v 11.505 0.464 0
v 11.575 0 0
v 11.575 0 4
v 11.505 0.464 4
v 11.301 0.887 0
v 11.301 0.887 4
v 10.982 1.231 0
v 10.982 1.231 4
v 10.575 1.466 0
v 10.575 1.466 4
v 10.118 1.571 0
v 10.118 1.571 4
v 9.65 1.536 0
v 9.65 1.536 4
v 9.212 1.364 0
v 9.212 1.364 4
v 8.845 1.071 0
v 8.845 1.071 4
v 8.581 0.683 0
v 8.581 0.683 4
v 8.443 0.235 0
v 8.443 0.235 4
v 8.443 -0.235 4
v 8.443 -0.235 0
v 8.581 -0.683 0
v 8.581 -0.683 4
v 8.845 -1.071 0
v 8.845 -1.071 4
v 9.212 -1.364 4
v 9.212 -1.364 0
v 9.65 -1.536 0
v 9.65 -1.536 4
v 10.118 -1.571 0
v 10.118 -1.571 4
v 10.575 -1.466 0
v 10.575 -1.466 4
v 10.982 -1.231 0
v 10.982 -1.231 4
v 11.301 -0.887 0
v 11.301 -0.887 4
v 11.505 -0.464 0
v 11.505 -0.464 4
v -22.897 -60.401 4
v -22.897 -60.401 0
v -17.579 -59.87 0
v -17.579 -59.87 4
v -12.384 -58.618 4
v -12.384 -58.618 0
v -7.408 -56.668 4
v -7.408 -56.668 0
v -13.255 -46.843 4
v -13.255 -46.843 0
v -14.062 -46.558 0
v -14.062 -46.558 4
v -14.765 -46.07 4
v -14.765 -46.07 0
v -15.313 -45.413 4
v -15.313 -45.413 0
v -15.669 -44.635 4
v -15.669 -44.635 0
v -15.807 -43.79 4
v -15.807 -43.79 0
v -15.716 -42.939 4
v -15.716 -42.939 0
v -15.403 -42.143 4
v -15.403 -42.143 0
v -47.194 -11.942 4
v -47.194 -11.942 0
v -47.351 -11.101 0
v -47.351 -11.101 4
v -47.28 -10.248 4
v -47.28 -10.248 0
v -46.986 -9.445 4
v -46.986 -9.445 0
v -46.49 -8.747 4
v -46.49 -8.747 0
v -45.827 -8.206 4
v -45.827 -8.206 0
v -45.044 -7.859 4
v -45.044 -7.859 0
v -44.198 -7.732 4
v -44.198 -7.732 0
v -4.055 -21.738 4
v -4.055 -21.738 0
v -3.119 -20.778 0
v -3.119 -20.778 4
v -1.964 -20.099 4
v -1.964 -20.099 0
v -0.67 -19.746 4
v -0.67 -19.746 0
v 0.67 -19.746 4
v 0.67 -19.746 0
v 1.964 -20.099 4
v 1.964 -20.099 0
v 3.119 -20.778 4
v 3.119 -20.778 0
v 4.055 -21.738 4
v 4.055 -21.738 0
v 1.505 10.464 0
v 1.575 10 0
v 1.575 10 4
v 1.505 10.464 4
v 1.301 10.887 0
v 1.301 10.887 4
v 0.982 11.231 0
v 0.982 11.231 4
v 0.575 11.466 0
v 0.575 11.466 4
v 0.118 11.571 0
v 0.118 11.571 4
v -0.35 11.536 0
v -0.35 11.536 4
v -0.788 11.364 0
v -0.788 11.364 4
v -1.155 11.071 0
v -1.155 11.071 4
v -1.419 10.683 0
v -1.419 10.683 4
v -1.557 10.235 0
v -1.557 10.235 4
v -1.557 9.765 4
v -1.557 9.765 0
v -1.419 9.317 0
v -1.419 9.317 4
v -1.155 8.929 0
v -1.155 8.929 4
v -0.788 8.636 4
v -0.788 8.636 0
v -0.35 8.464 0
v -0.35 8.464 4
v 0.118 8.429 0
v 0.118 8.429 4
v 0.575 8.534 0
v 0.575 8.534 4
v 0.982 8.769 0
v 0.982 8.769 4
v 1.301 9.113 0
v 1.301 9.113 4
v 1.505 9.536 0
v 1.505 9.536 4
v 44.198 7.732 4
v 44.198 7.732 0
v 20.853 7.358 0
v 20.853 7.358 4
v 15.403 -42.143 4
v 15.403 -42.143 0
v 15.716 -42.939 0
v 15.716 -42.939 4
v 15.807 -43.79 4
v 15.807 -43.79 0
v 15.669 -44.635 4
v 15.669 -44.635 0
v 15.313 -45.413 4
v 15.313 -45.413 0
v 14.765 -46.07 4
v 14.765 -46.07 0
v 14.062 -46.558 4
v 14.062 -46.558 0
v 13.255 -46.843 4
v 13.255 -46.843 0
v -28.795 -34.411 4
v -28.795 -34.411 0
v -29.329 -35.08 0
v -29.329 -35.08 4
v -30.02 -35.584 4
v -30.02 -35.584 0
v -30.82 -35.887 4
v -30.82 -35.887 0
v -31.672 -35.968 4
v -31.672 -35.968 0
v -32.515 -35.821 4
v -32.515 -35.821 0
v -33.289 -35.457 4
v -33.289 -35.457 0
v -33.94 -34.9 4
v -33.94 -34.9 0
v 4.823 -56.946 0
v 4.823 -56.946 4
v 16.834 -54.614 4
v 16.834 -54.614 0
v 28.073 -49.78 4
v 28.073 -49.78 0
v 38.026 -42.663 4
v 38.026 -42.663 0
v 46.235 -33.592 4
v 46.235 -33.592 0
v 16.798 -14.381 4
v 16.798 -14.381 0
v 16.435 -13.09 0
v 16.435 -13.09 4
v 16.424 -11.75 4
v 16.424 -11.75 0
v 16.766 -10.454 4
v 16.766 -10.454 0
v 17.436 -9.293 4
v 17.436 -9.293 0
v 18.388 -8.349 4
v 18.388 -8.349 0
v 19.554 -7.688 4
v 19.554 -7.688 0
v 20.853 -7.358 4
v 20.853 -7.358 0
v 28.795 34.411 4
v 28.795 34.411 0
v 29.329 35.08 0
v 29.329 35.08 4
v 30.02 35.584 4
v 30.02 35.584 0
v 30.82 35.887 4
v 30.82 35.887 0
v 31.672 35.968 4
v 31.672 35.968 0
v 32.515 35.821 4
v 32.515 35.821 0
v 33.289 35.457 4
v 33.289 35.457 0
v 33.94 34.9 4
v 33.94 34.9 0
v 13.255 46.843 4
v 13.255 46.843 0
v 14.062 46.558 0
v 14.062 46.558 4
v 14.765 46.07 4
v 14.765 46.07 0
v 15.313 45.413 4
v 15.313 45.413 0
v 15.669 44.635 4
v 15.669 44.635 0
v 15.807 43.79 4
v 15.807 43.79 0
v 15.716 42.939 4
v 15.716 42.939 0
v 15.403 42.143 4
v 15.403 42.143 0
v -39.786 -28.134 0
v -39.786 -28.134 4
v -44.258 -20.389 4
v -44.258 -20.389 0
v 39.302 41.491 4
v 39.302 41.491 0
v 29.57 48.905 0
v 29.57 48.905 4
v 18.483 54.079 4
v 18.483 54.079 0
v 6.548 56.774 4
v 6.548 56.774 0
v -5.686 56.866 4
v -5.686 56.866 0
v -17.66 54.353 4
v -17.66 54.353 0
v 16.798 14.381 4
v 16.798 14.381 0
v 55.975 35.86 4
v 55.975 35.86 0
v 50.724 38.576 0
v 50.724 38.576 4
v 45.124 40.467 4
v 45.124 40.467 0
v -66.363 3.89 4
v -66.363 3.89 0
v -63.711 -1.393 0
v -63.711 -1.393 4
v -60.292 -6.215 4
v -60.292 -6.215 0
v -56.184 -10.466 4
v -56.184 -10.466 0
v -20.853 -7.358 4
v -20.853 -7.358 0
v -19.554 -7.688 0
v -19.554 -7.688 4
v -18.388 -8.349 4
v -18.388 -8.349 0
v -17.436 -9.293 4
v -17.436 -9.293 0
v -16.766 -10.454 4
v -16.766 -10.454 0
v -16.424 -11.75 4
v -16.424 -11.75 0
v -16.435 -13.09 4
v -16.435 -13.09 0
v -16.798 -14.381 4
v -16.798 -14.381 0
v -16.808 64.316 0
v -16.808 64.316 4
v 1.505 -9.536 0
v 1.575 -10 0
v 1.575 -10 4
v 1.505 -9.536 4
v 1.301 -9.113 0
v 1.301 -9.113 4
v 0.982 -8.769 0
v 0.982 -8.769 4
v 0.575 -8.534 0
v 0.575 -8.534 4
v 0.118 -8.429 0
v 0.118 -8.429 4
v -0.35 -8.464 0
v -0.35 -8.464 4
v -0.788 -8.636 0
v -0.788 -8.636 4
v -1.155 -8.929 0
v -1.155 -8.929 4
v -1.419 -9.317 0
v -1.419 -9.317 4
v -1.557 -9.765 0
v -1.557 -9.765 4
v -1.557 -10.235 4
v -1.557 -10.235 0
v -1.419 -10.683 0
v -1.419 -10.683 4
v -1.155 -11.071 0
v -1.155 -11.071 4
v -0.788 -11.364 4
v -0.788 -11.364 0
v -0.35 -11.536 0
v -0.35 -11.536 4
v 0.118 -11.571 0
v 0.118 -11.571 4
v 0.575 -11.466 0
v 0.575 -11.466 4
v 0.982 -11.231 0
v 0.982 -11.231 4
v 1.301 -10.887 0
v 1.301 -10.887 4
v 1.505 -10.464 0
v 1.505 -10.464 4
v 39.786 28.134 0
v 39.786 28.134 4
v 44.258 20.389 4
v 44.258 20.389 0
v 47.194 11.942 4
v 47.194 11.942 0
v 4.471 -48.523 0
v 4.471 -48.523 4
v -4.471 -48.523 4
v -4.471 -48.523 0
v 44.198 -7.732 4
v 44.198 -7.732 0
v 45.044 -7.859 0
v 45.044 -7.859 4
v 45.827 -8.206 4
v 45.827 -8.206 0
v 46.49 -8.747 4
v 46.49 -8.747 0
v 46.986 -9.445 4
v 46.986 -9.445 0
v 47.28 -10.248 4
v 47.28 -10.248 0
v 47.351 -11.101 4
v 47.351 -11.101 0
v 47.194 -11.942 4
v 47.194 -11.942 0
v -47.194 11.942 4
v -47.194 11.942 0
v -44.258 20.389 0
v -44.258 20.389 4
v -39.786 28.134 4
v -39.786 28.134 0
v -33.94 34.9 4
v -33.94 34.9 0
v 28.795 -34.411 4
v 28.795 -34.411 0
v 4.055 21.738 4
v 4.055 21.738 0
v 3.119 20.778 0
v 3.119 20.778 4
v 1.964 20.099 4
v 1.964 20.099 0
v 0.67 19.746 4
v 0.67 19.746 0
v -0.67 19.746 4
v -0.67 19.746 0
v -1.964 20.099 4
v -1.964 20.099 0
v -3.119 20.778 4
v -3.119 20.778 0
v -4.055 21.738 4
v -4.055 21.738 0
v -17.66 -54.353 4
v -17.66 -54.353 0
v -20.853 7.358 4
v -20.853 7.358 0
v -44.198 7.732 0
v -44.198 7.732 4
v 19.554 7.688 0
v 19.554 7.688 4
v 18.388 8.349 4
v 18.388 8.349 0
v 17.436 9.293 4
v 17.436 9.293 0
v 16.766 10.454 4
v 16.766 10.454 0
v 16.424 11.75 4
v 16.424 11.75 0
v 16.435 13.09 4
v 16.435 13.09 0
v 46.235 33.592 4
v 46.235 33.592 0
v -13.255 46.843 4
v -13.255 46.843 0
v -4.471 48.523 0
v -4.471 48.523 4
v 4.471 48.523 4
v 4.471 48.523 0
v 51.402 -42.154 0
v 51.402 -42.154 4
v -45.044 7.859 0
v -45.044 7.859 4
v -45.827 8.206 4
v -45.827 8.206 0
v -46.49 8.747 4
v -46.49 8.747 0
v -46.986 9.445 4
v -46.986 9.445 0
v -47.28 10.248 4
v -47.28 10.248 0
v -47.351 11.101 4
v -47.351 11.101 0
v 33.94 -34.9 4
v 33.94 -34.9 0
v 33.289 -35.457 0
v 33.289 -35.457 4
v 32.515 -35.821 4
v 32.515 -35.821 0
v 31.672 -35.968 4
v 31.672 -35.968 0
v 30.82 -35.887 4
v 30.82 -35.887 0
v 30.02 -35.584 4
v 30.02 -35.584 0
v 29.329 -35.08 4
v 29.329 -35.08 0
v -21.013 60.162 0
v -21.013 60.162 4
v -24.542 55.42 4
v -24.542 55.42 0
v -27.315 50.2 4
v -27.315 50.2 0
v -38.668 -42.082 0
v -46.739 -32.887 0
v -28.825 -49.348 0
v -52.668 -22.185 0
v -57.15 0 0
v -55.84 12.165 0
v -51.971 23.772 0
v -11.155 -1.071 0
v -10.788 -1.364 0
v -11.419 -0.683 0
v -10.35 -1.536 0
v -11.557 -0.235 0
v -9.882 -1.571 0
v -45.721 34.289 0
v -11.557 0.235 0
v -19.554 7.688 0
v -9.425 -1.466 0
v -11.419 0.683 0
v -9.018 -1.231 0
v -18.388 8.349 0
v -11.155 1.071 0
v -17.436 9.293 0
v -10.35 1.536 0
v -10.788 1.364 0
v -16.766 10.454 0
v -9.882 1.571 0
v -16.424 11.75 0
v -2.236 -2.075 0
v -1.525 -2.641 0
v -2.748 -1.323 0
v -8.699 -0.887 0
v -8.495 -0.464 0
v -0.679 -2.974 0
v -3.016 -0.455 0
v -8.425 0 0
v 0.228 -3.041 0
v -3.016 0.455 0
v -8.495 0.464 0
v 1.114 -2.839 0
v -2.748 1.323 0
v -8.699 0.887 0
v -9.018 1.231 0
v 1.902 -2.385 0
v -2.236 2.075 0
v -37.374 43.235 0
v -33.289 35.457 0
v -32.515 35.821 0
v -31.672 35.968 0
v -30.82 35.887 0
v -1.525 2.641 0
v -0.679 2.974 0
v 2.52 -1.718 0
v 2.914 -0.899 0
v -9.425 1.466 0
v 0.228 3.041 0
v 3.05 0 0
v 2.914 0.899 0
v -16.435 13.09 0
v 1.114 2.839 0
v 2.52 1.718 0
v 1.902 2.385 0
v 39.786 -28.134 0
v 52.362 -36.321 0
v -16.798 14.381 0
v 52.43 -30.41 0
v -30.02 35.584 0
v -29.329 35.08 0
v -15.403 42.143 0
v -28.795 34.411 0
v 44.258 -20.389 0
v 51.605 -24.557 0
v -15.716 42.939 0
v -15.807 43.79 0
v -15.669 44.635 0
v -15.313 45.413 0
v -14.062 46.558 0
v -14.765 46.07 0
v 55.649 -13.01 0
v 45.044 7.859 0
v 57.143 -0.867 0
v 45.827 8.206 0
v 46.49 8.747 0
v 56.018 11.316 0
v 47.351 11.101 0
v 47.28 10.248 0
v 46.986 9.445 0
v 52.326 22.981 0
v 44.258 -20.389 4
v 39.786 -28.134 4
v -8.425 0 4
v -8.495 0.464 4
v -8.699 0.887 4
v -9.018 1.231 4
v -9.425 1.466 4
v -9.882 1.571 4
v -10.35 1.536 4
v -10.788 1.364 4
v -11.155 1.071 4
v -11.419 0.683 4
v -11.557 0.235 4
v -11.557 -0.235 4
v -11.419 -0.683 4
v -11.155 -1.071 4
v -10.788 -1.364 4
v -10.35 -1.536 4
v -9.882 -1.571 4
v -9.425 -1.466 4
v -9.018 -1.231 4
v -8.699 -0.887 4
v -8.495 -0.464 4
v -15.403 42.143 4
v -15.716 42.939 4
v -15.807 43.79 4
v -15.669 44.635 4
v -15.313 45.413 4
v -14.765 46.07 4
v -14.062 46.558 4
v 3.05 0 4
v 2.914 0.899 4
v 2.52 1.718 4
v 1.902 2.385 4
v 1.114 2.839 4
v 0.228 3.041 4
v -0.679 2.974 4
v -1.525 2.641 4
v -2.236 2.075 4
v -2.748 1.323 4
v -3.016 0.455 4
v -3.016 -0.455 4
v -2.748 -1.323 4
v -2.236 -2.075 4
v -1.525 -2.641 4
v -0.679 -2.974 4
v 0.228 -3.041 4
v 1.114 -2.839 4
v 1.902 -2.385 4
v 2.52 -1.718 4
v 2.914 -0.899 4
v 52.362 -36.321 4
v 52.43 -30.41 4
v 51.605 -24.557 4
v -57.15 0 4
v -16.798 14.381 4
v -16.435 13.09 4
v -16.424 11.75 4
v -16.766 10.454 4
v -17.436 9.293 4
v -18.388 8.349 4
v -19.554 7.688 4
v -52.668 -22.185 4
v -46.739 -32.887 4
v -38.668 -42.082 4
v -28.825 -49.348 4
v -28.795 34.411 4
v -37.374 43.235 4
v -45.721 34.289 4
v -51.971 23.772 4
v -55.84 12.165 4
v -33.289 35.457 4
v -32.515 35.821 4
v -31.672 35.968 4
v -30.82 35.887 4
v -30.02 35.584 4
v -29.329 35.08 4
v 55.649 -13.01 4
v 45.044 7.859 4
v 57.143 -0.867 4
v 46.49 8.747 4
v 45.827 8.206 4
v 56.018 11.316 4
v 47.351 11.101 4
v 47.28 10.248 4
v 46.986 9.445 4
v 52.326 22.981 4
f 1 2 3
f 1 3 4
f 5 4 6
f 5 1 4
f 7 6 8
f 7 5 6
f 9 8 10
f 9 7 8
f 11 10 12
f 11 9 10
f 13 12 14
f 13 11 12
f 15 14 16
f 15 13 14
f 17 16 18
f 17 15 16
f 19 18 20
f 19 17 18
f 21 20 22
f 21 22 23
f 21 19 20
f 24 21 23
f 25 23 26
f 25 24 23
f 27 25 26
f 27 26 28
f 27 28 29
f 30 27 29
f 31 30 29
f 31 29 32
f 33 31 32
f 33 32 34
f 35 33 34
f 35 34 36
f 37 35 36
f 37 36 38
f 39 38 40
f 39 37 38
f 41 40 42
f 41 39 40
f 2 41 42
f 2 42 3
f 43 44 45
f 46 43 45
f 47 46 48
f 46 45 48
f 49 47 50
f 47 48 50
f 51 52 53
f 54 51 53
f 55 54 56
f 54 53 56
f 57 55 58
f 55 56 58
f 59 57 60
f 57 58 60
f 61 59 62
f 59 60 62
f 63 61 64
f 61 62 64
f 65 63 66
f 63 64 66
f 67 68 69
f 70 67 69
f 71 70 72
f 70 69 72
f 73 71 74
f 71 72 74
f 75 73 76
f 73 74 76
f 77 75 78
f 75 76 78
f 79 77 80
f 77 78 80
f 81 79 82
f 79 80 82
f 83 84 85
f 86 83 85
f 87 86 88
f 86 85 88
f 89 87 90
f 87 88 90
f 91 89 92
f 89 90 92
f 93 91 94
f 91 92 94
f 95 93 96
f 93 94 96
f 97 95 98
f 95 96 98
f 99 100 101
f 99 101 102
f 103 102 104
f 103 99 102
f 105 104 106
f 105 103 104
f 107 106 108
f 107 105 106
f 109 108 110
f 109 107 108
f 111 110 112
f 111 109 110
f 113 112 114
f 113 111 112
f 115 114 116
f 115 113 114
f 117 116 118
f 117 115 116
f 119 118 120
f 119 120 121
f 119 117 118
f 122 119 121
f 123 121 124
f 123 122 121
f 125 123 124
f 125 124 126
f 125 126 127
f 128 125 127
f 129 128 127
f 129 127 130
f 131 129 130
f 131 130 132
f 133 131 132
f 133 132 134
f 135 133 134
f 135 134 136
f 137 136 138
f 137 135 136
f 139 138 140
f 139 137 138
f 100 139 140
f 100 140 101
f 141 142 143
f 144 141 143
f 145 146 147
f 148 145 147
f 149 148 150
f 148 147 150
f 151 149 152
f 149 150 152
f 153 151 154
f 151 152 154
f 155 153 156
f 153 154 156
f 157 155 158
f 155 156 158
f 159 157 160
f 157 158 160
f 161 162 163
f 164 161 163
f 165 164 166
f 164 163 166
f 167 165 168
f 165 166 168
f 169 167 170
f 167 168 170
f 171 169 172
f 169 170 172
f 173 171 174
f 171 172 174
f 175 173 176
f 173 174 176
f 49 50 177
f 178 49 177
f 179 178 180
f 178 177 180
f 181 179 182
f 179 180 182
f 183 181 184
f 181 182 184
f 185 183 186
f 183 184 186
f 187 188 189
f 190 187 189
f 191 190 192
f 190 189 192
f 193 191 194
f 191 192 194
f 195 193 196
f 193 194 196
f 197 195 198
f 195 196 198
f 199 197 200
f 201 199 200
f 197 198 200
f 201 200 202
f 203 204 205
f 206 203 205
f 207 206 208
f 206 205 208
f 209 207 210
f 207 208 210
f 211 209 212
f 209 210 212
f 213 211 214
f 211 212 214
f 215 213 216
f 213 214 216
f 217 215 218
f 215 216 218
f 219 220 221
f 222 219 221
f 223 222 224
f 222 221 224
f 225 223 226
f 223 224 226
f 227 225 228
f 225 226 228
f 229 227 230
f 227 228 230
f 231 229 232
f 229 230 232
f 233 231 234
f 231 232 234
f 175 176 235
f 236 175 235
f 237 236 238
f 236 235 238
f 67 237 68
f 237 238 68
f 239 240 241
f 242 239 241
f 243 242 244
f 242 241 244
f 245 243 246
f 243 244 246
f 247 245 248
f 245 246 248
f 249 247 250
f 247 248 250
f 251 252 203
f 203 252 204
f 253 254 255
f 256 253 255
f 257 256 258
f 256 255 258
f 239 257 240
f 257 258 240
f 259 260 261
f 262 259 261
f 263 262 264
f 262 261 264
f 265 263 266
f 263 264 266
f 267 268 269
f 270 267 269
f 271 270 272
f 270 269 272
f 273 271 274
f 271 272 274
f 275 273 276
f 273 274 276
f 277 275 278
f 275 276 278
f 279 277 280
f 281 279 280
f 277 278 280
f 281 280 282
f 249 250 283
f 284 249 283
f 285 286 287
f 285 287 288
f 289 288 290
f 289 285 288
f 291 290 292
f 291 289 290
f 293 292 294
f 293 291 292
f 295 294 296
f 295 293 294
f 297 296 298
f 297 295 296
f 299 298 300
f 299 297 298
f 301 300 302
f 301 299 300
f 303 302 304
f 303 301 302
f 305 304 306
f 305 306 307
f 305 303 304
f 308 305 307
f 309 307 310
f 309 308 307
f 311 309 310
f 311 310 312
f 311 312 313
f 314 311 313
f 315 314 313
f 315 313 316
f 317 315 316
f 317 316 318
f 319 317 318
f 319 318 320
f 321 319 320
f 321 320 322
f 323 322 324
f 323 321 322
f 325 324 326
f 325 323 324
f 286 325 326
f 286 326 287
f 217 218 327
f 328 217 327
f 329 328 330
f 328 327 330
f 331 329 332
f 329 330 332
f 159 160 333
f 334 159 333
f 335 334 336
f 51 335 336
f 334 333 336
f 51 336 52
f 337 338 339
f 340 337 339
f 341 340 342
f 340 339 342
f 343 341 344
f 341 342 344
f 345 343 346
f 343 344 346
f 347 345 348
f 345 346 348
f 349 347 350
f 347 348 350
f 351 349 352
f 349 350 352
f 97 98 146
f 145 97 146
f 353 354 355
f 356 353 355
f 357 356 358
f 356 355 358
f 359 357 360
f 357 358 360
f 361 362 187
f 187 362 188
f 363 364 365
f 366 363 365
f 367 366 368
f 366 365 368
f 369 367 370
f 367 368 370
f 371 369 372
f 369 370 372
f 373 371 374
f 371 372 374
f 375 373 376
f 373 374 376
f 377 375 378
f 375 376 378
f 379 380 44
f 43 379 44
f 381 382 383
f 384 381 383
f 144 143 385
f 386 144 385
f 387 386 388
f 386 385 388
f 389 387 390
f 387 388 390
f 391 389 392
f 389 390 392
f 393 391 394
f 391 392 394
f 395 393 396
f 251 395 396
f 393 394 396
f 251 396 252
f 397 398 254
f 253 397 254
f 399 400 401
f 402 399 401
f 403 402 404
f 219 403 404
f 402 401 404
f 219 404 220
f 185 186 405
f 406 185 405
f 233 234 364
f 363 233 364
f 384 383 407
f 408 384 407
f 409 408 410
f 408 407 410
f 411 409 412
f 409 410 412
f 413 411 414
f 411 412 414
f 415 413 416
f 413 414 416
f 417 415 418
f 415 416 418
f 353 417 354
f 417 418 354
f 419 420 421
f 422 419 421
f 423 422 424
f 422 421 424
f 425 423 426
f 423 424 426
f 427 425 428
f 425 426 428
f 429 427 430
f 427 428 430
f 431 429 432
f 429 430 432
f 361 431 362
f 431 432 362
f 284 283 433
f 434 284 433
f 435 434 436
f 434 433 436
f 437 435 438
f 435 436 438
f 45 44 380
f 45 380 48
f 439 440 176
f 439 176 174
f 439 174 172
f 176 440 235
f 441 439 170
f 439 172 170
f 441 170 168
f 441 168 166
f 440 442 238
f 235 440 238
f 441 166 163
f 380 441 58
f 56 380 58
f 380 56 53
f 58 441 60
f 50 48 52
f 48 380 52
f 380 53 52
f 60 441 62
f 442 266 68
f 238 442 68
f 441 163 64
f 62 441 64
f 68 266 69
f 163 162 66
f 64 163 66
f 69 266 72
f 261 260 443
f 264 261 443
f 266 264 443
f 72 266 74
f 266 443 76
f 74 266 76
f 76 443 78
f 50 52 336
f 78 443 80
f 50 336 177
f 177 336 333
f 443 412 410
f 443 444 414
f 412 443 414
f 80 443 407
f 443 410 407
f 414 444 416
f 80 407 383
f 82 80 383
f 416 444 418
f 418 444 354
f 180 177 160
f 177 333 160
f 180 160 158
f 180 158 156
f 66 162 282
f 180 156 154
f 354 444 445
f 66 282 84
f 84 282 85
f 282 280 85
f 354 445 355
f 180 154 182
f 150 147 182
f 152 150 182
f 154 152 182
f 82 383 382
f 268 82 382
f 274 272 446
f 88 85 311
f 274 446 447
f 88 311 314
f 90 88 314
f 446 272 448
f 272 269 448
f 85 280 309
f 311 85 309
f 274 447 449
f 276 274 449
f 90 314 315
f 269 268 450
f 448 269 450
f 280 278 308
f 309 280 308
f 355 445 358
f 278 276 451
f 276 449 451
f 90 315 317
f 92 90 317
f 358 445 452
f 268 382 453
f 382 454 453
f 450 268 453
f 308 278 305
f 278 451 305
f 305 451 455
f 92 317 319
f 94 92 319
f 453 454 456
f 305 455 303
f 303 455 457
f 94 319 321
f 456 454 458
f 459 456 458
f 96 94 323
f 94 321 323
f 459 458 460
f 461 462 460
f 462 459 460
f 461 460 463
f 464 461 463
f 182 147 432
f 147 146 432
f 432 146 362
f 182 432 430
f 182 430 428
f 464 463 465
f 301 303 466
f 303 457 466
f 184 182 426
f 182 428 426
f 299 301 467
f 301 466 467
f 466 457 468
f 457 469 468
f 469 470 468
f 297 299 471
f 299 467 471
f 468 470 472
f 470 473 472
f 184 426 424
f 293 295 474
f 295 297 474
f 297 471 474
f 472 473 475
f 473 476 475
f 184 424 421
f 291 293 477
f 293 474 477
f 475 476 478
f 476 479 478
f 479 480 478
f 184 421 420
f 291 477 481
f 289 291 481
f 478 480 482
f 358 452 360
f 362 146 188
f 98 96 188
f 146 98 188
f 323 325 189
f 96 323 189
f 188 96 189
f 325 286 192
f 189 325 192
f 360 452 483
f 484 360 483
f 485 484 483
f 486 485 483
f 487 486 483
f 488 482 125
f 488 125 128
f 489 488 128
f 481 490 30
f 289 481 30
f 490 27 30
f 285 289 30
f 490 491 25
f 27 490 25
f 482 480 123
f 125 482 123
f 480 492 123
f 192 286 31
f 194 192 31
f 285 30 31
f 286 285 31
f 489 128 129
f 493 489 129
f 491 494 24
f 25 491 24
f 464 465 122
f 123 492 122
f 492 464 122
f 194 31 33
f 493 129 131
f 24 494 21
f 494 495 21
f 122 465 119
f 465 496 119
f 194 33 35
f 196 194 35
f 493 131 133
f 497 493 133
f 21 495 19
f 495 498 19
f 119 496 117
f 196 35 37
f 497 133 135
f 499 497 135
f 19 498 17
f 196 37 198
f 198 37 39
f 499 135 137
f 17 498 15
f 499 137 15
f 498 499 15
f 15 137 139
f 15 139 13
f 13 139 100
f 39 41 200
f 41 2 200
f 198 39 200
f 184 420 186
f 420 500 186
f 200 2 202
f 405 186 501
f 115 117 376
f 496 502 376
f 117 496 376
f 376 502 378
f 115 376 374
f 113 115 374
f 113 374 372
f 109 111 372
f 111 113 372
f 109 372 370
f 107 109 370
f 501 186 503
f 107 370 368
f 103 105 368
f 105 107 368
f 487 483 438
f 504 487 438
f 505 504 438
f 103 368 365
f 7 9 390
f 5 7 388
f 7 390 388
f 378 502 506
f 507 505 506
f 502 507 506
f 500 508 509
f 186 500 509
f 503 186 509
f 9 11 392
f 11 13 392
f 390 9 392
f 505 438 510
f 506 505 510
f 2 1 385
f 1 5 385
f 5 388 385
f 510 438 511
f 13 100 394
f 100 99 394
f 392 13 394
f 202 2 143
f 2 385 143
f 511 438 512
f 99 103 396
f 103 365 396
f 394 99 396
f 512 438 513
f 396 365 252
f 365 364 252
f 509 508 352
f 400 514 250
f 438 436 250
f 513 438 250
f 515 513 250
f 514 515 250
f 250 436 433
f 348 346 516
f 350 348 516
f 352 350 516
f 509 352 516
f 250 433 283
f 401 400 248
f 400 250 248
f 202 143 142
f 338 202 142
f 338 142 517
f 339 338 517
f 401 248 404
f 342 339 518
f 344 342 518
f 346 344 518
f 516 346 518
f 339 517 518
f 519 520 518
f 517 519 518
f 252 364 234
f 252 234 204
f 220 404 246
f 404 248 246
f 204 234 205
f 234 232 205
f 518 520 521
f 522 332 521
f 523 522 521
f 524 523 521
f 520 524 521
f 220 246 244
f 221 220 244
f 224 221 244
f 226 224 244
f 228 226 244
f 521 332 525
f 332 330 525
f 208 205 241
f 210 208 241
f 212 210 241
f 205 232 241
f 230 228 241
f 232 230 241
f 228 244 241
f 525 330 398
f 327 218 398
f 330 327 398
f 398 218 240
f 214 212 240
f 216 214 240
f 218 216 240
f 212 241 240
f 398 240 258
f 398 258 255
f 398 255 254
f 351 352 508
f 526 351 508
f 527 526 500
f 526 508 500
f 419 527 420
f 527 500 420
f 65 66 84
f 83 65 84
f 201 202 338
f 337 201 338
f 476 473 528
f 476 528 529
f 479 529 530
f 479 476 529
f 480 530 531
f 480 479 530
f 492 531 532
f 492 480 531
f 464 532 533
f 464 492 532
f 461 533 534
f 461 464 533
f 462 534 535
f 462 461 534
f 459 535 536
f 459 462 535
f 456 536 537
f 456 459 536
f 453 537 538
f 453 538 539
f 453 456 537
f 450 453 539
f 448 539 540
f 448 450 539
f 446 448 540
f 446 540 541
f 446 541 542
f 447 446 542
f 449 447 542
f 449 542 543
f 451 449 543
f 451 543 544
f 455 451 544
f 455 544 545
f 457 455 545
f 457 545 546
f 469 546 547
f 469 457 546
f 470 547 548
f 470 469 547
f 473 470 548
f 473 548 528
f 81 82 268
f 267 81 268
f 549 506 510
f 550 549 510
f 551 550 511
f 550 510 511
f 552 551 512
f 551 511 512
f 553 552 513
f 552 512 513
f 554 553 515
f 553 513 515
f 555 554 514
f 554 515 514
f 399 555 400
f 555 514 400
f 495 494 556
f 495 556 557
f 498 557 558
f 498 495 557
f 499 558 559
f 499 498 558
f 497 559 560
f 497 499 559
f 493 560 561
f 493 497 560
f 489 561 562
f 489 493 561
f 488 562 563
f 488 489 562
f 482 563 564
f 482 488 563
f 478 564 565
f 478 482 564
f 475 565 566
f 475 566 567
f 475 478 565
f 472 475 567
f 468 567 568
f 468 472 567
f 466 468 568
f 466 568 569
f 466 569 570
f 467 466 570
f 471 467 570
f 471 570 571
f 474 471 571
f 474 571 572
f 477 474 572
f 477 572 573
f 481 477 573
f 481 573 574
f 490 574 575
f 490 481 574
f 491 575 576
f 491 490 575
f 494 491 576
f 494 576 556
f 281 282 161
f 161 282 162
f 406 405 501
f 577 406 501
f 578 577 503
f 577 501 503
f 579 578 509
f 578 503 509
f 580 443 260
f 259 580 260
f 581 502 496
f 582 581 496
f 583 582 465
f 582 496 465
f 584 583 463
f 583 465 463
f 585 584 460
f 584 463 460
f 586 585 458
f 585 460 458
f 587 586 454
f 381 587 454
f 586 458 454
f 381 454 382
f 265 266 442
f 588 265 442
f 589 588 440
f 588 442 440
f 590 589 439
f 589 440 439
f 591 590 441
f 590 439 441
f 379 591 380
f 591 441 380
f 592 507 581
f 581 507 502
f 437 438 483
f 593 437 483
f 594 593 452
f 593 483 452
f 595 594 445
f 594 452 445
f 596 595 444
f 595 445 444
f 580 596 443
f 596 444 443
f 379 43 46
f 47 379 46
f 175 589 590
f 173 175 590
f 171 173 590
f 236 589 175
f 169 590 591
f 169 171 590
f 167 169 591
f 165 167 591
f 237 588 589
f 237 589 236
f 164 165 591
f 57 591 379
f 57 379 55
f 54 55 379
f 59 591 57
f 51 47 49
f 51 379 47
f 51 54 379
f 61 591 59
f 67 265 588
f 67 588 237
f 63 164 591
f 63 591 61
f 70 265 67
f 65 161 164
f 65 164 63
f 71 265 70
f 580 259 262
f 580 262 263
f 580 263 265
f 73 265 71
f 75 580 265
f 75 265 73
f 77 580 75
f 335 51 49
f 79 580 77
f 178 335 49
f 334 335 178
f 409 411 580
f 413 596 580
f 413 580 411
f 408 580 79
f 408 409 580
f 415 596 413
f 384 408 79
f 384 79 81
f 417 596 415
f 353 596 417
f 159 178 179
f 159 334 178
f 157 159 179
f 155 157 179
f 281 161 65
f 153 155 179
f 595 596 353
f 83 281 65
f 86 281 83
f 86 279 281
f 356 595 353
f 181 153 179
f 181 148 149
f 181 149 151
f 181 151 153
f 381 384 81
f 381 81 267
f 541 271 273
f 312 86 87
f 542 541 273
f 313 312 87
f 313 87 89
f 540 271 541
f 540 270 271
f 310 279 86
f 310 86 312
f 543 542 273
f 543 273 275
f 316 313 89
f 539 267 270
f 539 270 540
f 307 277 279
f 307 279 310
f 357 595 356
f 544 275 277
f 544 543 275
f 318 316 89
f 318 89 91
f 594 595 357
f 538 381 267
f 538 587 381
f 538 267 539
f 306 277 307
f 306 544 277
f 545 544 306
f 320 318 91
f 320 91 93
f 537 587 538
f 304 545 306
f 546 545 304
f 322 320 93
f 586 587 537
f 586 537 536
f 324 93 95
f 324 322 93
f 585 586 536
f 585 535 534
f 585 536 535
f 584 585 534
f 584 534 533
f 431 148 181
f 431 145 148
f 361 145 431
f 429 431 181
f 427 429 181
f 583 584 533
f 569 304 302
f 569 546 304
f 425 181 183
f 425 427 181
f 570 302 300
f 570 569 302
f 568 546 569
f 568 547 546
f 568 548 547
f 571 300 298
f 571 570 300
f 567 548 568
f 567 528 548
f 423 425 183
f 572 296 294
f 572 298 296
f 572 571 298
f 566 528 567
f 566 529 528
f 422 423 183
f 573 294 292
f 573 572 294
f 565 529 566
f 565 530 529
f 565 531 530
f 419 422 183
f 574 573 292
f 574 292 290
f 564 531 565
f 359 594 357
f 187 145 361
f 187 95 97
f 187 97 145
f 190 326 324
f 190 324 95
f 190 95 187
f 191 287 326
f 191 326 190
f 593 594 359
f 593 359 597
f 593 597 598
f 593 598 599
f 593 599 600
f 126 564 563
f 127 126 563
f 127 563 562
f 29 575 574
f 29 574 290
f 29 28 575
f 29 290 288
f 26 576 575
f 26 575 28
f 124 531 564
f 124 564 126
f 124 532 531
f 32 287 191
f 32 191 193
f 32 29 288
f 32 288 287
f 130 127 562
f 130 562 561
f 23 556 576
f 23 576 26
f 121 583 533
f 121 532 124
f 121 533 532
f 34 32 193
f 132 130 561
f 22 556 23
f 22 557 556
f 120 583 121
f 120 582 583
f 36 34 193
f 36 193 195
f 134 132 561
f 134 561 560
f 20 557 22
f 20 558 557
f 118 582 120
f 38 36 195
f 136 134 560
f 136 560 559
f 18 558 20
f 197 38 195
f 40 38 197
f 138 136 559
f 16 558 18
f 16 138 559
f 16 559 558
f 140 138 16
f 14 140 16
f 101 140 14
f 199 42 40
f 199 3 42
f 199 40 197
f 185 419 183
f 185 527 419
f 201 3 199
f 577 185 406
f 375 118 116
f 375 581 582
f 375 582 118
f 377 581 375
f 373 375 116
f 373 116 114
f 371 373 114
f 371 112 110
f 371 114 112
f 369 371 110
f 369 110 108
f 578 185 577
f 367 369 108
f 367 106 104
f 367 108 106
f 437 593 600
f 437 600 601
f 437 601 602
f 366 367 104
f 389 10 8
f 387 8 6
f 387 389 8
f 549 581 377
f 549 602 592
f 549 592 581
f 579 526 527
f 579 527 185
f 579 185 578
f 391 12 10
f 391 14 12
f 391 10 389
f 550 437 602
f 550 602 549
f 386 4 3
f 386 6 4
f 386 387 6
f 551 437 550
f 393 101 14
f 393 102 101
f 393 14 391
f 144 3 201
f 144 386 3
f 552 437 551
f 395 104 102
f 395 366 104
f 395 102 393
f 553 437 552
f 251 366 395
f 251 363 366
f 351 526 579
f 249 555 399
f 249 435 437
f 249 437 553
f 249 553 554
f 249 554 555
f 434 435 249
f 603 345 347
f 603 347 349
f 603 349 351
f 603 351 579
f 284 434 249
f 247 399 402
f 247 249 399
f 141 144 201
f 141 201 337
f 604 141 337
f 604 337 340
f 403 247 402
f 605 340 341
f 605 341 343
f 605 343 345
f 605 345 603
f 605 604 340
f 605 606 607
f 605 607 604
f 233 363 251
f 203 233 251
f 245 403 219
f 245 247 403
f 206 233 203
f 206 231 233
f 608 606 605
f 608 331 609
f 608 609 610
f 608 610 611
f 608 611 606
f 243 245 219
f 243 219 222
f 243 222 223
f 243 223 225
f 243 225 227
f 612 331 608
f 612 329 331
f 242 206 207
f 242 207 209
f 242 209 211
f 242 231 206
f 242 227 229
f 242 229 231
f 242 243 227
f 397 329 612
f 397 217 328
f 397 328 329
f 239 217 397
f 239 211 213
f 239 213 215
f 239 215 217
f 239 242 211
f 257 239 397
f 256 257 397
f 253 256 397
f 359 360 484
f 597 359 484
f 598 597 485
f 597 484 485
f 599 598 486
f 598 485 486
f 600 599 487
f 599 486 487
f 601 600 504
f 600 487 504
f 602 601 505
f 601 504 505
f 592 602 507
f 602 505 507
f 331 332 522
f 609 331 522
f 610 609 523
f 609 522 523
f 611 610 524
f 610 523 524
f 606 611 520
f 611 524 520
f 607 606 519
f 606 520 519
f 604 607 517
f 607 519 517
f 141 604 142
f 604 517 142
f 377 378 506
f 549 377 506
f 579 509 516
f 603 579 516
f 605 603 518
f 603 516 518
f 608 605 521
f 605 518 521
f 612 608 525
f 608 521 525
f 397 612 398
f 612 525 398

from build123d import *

# Parameters (mm, degrees)
F0_R     = 1.575
F0_R_2   = 3.05
F1_DEPTH = 4


with BuildPart() as f1:
    # F0 (on Top) → F1 (new body)
    with BuildSketch(Plane.XY):
        with BuildLine():
            ThreePointArc((-66.362554, 3.889581), (-62.092779, -3.869236), (-56.183578, -10.465566))
            ThreePointArc((-56.183578, -10.465566), (-42.950605, -37.701035), (-17.660321, -54.35288))
            Line((-17.660321, -54.35288), (-22.897159, -60.400651))
            ThreePointArc((-22.897159, -60.400651), (-14.960223, -59.333067), (-7.408336, -56.667796))
            ThreePointArc((-7.408336, -56.667796), (22.583349, -52.498713), (46.235321, -33.591927))
            Line((46.235321, -33.591927), (51.402196, -42.153668))
            ThreePointArc((51.402196, -42.153668), (52.508394, -33.366942), (51.604975, -24.557058))
            ThreePointArc((51.604975, -24.557058), (56.907882, 5.255046), (46.235321, 33.591927))
            Line((46.235321, 33.591927), (55.974673, 35.860194))
            ThreePointArc((55.974673, 35.860194), (47.959834, 39.627498), (39.301964, 41.490699))
            ThreePointArc((39.301964, 41.490699), (12.587657, 55.74651), (-17.660321, 54.35288))
            Line((-17.660321, 54.35288), (-16.807946, 64.316486))
            ThreePointArc((-16.807946, 64.316486), (-22.867587, 57.858083), (-27.315025, 50.19972))
            ThreePointArc((-27.315025, 50.19972), (-49.128282, 29.198192), (-57.15, 0))
            Line((-57.15, 0), (-66.362554, 3.889581))
        make_face()
        with BuildLine():
            ThreePointArc((-33.939505, -34.900173), (-42.205105, -24.367129), (-47.194189, -11.942387))
            ThreePointArc((-47.194189, -11.942387), (-46.760906, -9.079501), (-44.198279, -7.731618))
            Line((-44.198279, -7.731618), (-20.853145, -7.357517))
            ThreePointArc((-20.853145, -7.357517), (-17.06203, -9.850768), (-16.798369, -14.380595))
            Line((-16.798369, -14.380595), (-28.794917, -34.411023))
            ThreePointArc((-28.794917, -34.411023), (-31.243532, -35.956382), (-33.939505, -34.900173))
        make_face(mode=Mode.SUBTRACT)
        with Locations((-10, 0)):
            Circle(F0_R, mode=Mode.SUBTRACT)
        with BuildLine():
            ThreePointArc((13.254683, -46.84256), (0, -48.734257), (-13.254683, -46.84256))
            ThreePointArc((-13.254683, -46.84256), (-15.517374, -45.035883), (-15.403362, -42.142641))
            Line((-15.403362, -42.142641), (-4.054776, -21.738112))
            ThreePointArc((-4.054776, -21.738112), (0, -19.701535), (4.054776, -21.738112))
            Line((4.054776, -21.738112), (15.403362, -42.142641))
            ThreePointArc((15.403362, -42.142641), (15.517374, -45.035883), (13.254683, -46.84256))
        make_face(mode=Mode.SUBTRACT)
        with Locations((0, -10)):
            Circle(F0_R, mode=Mode.SUBTRACT)
        Circle(F0_R_2, mode=Mode.SUBTRACT)
        with Locations((10, 0)):
            Circle(F0_R, mode=Mode.SUBTRACT)
        with BuildLine():
            ThreePointArc((47.194189, -11.942387), (42.205105, -24.367129), (33.939505, -34.900173))
            ThreePointArc((33.939505, -34.900173), (31.243532, -35.956382), (28.794917, -34.411023))
            Line((28.794917, -34.411023), (16.798369, -14.380595))
            ThreePointArc((16.798369, -14.380595), (17.06203, -9.850768), (20.853145, -7.357517))
            Line((20.853145, -7.357517), (44.198279, -7.731618))
            ThreePointArc((44.198279, -7.731618), (46.760906, -9.079501), (47.194189, -11.942387))
        make_face(mode=Mode.SUBTRACT)
        with BuildLine():
            ThreePointArc((-47.194189, 11.942387), (-42.205105, 24.367129), (-33.939505, 34.900173))
            ThreePointArc((-33.939505, 34.900173), (-31.243532, 35.956382), (-28.794917, 34.411023))
            Line((-28.794917, 34.411023), (-16.798369, 14.380595))
            ThreePointArc((-16.798369, 14.380595), (-17.06203, 9.850768), (-20.853145, 7.357517))
            Line((-20.853145, 7.357517), (-44.198279, 7.731618))
            ThreePointArc((-44.198279, 7.731618), (-46.760906, 9.079501), (-47.194189, 11.942387))
        make_face(mode=Mode.SUBTRACT)
        with Locations((0, 10)):
            Circle(F0_R, mode=Mode.SUBTRACT)
        with BuildLine():
            ThreePointArc((20.853145, 7.357517), (17.06203, 9.850768), (16.798369, 14.380595))
            Line((16.798369, 14.380595), (28.794917, 34.411023))
            ThreePointArc((28.794917, 34.411023), (31.243532, 35.956382), (33.939505, 34.900173))
            ThreePointArc((33.939505, 34.900173), (42.205105, 24.367129), (47.194189, 11.942387))
            ThreePointArc((47.194189, 11.942387), (46.760906, 9.079501), (44.198279, 7.731618))
            Line((44.198279, 7.731618), (20.853145, 7.357517))
        make_face(mode=Mode.SUBTRACT)
        with BuildLine():
            Line((15.403362, 42.142641), (4.054776, 21.738112))
            ThreePointArc((4.054776, 21.738112), (0, 19.701535), (-4.054776, 21.738112))
            Line((-4.054776, 21.738112), (-15.403362, 42.142641))
            ThreePointArc((-15.403362, 42.142641), (-15.517374, 45.035883), (-13.254683, 46.84256))
            ThreePointArc((-13.254683, 46.84256), (0, 48.734257), (13.254683, 46.84256))
            ThreePointArc((13.254683, 46.84256), (15.517374, 45.035883), (15.403362, 42.142641))
        make_face(mode=Mode.SUBTRACT)
    extrude(amount=F1_DEPTH)


solid = f1.part
